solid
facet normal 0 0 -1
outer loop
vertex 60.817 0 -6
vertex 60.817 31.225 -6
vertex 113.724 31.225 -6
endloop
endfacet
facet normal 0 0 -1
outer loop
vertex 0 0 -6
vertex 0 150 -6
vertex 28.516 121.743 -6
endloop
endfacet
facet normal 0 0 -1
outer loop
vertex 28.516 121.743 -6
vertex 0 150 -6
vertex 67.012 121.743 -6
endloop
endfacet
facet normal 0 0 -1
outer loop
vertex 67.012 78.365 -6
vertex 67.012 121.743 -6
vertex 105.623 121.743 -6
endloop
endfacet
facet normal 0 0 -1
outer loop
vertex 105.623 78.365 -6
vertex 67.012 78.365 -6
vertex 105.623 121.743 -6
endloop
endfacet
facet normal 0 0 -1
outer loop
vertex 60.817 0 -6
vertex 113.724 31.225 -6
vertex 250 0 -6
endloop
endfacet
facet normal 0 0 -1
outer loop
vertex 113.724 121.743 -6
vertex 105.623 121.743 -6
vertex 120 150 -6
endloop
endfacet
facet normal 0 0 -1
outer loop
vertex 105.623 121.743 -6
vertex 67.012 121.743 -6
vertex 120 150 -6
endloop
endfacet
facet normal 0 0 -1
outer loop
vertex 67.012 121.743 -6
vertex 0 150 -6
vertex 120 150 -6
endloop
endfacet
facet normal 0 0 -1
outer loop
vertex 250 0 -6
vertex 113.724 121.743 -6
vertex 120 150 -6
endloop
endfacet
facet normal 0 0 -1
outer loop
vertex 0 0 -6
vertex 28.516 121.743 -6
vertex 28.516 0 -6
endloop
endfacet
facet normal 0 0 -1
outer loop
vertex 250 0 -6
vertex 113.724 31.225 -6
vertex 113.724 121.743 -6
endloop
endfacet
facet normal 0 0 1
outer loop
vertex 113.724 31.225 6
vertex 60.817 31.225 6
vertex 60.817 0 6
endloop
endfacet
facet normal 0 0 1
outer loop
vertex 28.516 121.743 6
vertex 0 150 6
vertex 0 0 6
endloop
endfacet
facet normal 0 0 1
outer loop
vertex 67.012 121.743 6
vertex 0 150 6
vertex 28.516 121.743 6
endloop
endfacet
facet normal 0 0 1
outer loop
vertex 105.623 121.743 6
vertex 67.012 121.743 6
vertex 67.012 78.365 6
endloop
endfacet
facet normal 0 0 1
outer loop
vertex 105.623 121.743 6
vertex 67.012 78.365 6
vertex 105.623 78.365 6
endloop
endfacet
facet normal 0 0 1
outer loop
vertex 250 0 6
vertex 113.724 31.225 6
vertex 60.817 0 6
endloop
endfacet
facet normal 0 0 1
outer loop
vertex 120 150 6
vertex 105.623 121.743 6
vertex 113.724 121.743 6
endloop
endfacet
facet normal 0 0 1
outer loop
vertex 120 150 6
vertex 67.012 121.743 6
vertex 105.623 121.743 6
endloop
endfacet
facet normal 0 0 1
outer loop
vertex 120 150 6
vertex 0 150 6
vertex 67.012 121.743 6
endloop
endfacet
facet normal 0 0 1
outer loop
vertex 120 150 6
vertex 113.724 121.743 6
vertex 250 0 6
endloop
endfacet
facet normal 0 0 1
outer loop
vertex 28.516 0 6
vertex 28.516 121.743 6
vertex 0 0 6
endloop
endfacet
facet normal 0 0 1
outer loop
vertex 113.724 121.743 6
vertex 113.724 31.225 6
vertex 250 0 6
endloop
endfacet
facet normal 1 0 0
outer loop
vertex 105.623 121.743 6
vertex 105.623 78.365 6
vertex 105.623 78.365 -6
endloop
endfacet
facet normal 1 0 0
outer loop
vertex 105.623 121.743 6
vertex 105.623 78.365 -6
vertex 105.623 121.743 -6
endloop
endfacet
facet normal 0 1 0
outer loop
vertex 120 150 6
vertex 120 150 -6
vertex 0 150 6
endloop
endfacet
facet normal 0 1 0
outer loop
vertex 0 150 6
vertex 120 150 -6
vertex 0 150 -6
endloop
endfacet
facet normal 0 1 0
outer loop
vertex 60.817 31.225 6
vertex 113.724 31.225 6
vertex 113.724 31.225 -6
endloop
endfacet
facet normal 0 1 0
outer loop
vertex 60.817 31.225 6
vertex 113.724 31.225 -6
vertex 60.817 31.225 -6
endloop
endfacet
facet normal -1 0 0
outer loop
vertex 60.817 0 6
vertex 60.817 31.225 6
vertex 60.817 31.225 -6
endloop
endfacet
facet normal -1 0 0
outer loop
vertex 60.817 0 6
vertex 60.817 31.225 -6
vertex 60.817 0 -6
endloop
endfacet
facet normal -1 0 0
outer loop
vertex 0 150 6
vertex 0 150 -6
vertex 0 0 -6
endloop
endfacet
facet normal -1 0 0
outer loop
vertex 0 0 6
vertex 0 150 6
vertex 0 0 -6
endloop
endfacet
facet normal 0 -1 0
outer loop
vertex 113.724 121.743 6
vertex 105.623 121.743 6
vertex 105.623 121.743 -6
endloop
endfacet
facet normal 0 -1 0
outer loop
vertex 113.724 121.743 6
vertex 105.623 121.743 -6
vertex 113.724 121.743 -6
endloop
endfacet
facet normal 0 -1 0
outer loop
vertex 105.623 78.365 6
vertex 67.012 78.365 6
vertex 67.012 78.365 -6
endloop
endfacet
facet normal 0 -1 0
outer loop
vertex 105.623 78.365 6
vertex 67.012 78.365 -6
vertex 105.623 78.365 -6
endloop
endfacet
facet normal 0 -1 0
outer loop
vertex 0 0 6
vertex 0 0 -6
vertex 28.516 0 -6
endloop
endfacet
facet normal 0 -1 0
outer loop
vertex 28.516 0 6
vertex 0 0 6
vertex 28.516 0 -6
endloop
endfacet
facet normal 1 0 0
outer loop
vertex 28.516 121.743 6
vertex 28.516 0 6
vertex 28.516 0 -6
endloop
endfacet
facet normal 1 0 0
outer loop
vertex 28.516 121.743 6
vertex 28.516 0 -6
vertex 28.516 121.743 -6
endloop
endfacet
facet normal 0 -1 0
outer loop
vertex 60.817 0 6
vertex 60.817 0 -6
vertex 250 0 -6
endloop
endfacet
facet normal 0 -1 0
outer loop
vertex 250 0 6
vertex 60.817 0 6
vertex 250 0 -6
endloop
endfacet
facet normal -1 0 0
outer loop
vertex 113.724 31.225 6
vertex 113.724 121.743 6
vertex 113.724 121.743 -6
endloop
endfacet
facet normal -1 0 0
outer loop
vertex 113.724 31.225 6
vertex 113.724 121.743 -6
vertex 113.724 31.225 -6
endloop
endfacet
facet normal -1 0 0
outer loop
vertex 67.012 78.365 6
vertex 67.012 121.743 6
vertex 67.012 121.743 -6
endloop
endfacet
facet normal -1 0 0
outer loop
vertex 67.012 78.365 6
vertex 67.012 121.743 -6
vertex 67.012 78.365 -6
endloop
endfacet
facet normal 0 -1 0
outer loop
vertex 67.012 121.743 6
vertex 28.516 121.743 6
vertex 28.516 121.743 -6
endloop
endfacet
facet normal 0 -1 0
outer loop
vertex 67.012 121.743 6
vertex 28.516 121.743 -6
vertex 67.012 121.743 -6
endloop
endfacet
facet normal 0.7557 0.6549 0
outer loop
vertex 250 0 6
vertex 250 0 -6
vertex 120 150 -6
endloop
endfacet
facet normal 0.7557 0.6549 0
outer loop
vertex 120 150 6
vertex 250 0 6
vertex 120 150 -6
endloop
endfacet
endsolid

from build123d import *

# Parameters (mm, degrees)
BOSS_EXTRU_1_DEPTH      = 6
BOSS_EXTRU_1_DEPTH_BACK = 6
ENL_V_MAT_EXTRU_1_DEPTH = 292.794448199


with BuildPart() as part:
    # Esquisse1 → Boss.-Extru.1 (new, two sides: drawn at the far end of the back side and taken through both)
    with BuildSketch(Plane.XY.offset(-BOSS_EXTRU_1_DEPTH_BACK)):
        Polygon((0, 0), (250, 0), (120, 150), (0, 150), align=None)
    extrude(amount=BOSS_EXTRU_1_DEPTH + BOSS_EXTRU_1_DEPTH_BACK)

    # Esquisse2 → Enlèv. mat.-Extru.1 (cut, through all)
    with BuildSketch(Plane.XY.offset(6)):
        Polygon((28.515807323, 0), (28.515807323, 121.742691755), (67.012431024, 121.742691755), (67.012431024, 78.36465188), (105.62326997, 78.36465188), (105.62326997, 121.742691755), (113.72405631, 121.742691755), (113.72405631, 31.224508755), (60.816510283, 31.224508755), (60.816510283, 0), align=None)
    extrude(amount=-ENL_V_MAT_EXTRU_1_DEPTH, mode=Mode.SUBTRACT)


solid = part.part
